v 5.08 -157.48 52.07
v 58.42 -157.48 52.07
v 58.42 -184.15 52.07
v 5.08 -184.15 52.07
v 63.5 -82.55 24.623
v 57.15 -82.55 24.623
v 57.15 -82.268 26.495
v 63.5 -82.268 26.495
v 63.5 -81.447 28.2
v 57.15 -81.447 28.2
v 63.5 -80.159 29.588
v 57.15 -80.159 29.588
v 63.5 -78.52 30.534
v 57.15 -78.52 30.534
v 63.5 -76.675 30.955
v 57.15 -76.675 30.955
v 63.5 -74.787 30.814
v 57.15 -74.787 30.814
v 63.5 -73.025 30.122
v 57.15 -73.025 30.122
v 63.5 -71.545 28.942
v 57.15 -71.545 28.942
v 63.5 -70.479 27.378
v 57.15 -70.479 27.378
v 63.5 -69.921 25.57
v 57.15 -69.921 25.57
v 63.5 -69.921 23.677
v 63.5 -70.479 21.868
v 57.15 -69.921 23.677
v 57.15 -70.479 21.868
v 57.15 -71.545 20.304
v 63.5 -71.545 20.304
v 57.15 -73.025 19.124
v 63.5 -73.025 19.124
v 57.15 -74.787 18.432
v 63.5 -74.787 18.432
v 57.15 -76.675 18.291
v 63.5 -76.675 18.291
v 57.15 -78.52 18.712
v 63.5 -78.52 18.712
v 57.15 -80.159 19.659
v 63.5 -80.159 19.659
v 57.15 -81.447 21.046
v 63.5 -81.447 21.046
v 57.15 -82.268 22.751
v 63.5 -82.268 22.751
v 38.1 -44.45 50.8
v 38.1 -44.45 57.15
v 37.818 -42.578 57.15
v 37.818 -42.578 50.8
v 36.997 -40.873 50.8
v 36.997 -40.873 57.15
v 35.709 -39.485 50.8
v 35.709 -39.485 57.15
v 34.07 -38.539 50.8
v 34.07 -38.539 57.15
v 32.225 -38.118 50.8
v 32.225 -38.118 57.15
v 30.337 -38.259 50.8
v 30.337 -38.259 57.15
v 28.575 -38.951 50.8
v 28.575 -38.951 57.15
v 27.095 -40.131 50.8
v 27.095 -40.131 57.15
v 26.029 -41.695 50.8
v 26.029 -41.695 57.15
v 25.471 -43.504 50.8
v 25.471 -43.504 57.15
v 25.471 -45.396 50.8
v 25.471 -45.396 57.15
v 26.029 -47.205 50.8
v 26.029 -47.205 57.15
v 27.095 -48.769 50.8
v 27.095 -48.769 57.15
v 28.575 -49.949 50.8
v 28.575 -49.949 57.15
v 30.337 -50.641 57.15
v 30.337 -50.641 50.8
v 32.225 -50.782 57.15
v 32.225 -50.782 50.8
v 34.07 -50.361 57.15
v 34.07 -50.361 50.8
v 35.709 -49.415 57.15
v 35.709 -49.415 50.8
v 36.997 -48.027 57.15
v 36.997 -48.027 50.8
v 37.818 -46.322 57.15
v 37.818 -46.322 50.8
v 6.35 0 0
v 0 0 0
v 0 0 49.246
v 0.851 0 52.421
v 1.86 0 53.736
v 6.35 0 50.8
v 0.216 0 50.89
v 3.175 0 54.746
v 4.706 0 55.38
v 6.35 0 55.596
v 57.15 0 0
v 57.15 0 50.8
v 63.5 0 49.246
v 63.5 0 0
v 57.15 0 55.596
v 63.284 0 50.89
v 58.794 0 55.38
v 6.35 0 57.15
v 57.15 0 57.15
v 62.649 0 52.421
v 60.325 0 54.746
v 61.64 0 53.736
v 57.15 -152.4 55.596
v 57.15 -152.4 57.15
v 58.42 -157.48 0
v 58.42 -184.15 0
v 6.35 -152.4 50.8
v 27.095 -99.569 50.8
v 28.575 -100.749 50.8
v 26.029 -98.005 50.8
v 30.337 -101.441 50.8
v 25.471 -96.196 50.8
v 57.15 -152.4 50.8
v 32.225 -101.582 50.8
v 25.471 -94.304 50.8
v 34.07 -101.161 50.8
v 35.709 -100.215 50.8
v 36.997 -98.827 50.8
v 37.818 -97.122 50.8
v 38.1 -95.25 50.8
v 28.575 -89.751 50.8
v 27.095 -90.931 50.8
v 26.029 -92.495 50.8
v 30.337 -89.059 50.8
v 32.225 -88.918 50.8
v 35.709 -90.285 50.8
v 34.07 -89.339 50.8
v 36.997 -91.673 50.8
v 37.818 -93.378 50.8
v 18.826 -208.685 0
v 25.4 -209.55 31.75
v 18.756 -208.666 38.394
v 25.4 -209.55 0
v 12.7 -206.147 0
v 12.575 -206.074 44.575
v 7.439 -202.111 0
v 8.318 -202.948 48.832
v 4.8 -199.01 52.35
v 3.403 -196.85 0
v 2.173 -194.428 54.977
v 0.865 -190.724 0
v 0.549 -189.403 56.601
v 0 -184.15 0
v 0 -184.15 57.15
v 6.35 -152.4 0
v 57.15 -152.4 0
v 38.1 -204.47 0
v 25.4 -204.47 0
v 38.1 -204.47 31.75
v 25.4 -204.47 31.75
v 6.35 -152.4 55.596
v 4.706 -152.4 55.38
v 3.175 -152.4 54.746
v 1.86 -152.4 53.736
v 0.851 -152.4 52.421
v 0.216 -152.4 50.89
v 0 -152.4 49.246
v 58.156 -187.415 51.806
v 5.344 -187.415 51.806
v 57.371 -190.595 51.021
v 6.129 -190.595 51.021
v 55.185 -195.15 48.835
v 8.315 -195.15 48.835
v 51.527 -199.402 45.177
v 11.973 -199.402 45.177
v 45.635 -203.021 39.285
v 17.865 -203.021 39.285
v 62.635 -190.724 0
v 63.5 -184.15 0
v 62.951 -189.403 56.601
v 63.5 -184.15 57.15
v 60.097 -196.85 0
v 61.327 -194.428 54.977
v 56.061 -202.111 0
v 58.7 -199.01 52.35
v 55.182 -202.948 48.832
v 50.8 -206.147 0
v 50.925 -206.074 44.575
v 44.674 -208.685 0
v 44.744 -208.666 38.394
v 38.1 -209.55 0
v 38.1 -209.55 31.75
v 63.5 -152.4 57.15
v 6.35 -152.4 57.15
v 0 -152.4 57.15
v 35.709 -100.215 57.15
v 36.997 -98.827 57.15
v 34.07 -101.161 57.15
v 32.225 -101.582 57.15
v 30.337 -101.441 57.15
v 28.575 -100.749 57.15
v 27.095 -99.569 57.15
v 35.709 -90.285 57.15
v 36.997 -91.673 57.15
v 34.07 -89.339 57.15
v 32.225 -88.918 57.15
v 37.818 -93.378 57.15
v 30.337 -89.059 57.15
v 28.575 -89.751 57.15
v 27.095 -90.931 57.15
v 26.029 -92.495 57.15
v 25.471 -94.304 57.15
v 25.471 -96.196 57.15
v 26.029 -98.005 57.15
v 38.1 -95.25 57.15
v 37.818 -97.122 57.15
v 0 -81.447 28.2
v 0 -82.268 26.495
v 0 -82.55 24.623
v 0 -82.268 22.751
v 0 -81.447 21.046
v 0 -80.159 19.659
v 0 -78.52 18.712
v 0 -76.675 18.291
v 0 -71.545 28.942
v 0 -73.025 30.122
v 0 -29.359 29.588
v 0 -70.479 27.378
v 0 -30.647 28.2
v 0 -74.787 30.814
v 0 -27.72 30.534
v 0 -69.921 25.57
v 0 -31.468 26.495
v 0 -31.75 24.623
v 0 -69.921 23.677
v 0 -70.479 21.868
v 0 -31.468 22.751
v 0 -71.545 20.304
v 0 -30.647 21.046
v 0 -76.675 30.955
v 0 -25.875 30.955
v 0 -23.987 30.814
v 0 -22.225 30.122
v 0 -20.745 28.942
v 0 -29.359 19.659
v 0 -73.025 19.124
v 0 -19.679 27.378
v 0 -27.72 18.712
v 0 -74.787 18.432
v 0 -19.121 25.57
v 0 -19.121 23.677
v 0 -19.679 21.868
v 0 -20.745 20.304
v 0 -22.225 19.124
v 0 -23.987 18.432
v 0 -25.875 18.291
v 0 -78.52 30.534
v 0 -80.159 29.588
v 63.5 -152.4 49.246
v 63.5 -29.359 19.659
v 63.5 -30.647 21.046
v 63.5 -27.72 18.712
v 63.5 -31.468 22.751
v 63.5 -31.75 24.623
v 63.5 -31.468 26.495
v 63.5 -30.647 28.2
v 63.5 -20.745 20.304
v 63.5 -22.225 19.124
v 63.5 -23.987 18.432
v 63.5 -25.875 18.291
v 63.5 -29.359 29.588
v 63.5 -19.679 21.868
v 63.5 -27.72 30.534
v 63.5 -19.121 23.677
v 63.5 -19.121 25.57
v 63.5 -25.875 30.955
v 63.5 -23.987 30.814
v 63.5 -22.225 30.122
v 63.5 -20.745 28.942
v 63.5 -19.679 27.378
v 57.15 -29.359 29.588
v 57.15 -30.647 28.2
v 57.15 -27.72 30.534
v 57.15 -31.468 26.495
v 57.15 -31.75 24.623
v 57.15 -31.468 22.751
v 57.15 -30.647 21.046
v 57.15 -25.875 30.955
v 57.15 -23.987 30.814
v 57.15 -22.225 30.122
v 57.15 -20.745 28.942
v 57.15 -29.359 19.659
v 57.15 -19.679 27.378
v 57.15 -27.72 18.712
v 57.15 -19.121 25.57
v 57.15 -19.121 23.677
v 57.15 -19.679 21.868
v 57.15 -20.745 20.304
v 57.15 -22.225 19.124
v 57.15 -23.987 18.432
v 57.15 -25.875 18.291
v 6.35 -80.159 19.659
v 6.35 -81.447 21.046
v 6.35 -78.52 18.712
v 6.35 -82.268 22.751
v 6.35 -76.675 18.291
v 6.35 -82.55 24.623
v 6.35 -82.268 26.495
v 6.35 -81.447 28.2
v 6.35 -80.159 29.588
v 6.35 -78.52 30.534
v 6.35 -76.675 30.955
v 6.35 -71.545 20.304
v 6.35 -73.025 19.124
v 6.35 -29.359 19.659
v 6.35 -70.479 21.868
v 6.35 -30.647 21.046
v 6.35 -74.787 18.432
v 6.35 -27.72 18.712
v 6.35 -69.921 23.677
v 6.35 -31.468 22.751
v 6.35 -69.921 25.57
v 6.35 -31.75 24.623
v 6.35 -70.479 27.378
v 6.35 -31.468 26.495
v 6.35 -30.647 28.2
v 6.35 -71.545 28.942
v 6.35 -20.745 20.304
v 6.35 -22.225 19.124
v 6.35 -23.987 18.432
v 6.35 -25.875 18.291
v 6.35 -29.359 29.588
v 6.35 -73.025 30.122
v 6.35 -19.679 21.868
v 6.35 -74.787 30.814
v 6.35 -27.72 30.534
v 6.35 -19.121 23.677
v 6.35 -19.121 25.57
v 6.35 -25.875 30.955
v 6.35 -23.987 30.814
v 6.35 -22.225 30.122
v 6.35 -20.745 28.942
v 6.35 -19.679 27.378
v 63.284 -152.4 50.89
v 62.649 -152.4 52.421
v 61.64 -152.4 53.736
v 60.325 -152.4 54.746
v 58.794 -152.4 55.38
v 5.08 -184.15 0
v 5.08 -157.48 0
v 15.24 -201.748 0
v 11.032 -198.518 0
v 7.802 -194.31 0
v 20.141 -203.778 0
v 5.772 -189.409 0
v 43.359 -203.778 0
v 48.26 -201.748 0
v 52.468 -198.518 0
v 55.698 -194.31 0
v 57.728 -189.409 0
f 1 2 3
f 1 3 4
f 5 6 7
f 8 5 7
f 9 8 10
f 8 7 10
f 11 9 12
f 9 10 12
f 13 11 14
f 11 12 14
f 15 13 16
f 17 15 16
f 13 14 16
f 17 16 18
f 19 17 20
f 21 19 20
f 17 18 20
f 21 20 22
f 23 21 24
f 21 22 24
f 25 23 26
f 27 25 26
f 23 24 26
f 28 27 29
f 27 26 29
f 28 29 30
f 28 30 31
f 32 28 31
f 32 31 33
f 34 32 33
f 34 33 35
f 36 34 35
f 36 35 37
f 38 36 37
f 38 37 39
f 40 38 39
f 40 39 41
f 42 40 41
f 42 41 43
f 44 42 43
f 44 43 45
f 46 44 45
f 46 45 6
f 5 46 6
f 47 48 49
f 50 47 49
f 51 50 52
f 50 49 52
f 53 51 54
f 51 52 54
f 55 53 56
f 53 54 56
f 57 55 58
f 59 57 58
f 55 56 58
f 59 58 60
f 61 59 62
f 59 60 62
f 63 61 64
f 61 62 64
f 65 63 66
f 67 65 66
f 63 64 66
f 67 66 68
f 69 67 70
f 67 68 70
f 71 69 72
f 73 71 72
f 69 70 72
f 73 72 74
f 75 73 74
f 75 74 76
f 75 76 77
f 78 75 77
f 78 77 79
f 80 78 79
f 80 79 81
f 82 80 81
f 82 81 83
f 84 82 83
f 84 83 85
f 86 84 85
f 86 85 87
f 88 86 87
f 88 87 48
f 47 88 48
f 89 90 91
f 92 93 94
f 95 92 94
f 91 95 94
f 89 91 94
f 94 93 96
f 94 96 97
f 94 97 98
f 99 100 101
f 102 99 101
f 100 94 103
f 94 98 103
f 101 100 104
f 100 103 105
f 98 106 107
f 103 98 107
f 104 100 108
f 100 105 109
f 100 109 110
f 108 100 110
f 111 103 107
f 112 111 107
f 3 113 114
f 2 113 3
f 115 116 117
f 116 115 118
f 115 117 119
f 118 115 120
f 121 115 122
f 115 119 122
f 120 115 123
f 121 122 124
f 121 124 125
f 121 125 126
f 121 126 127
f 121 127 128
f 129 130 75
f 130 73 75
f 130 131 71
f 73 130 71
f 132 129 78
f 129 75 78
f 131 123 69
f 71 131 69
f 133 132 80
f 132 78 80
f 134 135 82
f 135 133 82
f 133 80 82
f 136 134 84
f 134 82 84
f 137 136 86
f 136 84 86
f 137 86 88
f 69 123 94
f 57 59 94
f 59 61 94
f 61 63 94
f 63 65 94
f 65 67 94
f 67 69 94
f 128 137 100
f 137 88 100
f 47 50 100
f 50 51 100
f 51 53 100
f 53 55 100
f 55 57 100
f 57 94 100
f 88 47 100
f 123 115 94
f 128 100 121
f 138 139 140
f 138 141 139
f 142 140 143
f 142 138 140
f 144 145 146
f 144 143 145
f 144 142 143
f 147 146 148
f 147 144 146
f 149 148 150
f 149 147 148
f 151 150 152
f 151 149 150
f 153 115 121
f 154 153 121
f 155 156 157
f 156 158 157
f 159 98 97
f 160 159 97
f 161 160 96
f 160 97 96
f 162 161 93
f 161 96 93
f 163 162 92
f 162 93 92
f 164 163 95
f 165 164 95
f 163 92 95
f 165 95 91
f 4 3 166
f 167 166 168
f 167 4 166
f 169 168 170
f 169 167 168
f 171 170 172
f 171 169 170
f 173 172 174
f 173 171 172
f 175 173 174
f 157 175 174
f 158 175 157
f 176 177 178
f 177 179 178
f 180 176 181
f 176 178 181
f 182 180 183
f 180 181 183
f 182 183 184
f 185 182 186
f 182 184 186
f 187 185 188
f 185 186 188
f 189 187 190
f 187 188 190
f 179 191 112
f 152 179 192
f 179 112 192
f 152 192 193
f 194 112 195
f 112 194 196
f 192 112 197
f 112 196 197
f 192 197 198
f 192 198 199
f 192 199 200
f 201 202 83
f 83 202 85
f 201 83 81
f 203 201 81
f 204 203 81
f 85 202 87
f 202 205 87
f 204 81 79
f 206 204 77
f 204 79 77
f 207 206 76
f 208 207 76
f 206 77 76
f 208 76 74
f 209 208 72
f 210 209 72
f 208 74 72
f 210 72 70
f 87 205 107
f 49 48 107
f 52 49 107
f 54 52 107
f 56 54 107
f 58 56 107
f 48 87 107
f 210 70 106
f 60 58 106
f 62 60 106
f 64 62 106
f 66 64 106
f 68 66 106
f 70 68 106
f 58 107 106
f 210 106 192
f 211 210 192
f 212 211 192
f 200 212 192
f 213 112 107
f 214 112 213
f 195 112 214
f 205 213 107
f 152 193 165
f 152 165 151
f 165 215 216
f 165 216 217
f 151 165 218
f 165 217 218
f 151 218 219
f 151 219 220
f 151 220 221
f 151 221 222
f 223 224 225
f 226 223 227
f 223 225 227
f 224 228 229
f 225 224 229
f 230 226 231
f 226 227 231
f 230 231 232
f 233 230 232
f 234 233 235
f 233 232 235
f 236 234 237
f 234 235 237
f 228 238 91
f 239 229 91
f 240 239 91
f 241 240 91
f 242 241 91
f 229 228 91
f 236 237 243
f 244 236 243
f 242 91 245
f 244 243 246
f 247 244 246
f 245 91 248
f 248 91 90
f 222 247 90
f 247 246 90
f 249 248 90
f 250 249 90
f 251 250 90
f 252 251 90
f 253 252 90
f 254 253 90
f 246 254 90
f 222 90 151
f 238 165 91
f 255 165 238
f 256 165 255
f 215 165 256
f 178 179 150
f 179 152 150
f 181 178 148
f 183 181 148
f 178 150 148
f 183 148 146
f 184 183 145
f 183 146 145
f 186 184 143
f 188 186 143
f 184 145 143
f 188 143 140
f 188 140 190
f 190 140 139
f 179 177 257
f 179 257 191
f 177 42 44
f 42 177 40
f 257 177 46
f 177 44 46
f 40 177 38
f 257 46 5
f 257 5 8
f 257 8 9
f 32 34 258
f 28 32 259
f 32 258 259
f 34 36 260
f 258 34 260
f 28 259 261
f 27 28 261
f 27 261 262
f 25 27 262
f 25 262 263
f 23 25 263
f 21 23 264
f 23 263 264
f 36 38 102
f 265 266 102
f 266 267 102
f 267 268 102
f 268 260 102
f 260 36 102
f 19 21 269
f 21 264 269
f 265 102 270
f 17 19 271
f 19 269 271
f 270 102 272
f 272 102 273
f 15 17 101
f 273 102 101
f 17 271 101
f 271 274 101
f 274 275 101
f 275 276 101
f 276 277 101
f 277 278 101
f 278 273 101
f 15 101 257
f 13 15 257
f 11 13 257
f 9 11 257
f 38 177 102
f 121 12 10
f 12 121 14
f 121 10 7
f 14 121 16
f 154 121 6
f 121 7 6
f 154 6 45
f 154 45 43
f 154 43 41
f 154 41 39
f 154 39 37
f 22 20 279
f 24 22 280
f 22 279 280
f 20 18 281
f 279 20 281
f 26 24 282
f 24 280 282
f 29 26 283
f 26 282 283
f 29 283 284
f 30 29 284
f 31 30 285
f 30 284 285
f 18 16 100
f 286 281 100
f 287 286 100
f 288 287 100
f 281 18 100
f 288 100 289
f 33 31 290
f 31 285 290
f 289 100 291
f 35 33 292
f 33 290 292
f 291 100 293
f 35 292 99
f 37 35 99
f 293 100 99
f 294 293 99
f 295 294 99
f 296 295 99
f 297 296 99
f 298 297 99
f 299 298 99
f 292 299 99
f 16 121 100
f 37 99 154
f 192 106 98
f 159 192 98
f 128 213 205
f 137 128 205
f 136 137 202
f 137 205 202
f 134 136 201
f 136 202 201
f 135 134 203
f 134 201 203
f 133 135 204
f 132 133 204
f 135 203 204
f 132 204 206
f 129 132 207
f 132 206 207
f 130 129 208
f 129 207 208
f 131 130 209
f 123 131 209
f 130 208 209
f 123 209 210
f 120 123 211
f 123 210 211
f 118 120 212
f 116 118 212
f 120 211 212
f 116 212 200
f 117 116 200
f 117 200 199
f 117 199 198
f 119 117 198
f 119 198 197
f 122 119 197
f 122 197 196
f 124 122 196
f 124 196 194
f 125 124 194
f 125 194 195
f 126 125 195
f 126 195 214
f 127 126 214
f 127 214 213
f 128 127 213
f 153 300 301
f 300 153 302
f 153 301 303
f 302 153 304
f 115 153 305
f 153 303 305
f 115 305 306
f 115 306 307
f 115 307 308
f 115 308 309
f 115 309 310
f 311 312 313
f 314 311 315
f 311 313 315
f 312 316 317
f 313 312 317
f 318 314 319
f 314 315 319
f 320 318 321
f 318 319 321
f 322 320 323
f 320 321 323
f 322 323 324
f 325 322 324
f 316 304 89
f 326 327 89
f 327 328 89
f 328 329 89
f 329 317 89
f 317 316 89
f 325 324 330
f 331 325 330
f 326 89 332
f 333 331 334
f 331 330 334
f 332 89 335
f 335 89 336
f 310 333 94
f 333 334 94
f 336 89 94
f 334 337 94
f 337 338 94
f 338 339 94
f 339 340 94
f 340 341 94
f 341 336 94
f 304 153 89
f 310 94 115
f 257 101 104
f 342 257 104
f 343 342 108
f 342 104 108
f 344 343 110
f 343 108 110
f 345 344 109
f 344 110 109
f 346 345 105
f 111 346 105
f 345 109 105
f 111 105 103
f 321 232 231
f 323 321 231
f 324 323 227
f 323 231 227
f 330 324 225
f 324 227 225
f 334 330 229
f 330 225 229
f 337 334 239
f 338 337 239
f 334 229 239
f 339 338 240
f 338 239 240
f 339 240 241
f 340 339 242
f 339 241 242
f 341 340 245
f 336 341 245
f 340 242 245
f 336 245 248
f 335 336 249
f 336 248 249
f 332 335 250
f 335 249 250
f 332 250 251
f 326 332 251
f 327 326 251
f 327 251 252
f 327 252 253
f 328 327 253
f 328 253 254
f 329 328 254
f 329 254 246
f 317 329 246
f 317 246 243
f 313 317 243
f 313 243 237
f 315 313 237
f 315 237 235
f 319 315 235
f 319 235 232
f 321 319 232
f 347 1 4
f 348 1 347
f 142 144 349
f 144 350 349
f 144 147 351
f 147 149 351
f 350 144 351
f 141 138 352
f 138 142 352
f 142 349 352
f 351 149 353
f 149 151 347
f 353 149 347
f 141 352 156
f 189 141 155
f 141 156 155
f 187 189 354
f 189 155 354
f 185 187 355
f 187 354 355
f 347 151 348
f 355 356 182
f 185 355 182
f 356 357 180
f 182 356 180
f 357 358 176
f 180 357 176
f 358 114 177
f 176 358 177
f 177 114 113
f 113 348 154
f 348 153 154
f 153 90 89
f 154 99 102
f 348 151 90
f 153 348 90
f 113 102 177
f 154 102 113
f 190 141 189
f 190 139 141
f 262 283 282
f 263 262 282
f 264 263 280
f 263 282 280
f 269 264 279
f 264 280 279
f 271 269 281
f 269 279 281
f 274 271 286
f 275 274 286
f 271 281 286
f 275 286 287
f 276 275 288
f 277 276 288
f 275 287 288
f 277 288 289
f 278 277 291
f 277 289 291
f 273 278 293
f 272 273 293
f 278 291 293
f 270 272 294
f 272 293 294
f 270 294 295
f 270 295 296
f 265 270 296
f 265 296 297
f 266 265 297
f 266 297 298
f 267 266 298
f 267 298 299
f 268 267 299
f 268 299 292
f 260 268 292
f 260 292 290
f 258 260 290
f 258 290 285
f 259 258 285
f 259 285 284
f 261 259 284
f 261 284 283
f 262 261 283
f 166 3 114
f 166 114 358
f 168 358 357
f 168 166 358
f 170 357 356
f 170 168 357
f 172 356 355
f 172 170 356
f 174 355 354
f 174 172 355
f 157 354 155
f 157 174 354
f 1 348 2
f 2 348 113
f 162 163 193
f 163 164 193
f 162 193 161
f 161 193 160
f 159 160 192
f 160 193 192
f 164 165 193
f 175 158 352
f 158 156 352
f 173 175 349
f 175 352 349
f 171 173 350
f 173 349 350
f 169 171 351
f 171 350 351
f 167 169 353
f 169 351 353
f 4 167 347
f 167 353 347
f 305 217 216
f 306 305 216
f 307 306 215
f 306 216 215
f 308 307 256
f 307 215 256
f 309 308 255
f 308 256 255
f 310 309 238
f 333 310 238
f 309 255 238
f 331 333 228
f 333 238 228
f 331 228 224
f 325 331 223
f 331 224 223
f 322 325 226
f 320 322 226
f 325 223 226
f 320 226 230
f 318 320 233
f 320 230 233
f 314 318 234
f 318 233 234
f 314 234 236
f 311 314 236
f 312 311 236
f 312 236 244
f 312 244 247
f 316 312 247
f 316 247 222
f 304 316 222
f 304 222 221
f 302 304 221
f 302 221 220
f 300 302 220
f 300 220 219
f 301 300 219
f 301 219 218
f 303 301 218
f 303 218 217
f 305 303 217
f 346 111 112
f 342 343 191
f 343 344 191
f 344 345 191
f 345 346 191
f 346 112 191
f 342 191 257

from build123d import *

# Parameters (mm, degrees)
F1_DEPTH     = 152.4
F2_W         = 50.8
F2_H         = 50.8
F3_DEPTH     = 57.15
F4_R         = 25.4
F5_T         = 5.08
F5_T3_DEPTH  = 11.7136995755
F5_T5_DEPTH  = 162.56
F5_T7_DEPTH  = 60.96
F5_T9_DEPTH  = 60.96
F5_T12_ANGLE = 90.000000001
F5_T14_ANGLE = 90.000000001
F6_R         = 6.35
F7_DEPTH     = 63.501
F8_R         = 6.35
F9_DEPTH     = 57.151


# Not quite as in the source:
# - a shell that OpenCascade refuses in one call is made with other operations: the cavity is built on its own and cut out


with BuildPart() as f1:
    # F0 (on Front) → F1 (new body)
    with BuildSketch(Plane.XZ):
        with BuildLine():
            Line((0, 49.2463004245), (0, 0))
            Line((0, 0), (6.35, 0))
            Line((6.35, 0), (6.35, 50.8))
            Line((6.35, 50.8), (57.15, 50.8))
            Line((57.15, 50.8), (57.15, 0))
            Line((57.15, 0), (63.5, 0))
            Line((63.5, 0), (63.5, 49.2463004245))
            ThreePointArc((63.5, 49.2463004245), (61.6401280605, 53.736428485), (57.15, 55.5963004245))
            Line((57.15, 55.5963004245), (57.15, 57.15))
            Line((57.15, 57.15), (6.35, 57.15))
            Line((6.35, 57.15), (6.35, 55.5963004245))
            ThreePointArc((6.35, 55.5963004245), (1.8598719395, 53.736428485), (0, 49.2463004245))
        make_face()
    extrude(amount=F1_DEPTH)

    # F2 (on face) → F3 (join)
    with BuildSketch(Plane.XZ.offset(152.4)):
        with BuildLine():
            Line((0, 49.2463004245), (0, 0))
            Line((0, 0), (6.35, 0))
            Line((6.35, 0), (6.35, 50.8))
            Line((6.35, 50.8), (57.15, 50.8))
            Line((57.15, 50.8), (57.15, 0))
            Line((57.15, 0), (63.5, 0))
            Line((63.5, 0), (63.5, 49.2463004245))
            ThreePointArc((63.5, 49.2463004245), (61.6401280605, 53.736428485), (57.15, 55.5963004245))
            Line((57.15, 55.5963004245), (57.15, 57.15))
            Line((57.15, 57.15), (6.35, 57.15))
            Line((6.35, 57.15), (6.35, 55.5963004245))
            ThreePointArc((6.35, 55.5963004245), (1.8598719395, 53.736428485), (0, 49.2463004245))
        make_face()
        with BuildLine():
            Line((0, 57.15), (0, 49.2463004245))
            ThreePointArc((0, 49.2463004245), (1.8598719395, 53.736428485), (6.35, 55.5963004245))
            Line((6.35, 55.5963004245), (6.35, 57.15))
            Line((6.35, 57.15), (0, 57.15))
        make_face()
        with BuildLine():
            ThreePointArc((57.15, 55.5963004245), (61.6401280605, 53.736428485), (63.5, 49.2463004245))
            Line((63.5, 49.2463004245), (63.5, 57.15))
            Line((63.5, 57.15), (57.15, 57.15))
            Line((57.15, 57.15), (57.15, 55.5963004245))
        make_face()
        with Locations((31.75, 25.4)):
            Rectangle(F2_W, F2_H)
    extrude(amount=F3_DEPTH)

    # F4
    f4_edges = [f1.edges().sort_by_distance(p)[0] for p in [
        (31.75, -209.55, 57.15),
        (0, -209.55, 28.575),
        (63.5, -209.55, 28.575),
    ]]
    fillet(f4_edges, radius=F4_R)

    # F5: shell of thickness 5.08, made by hand


with BuildPart() as f5_core1:
    # F5_t2: copy of F1
    add(f1.part)

    # the walls: a layer under each face that stays
    f5_faces = [f5_core1.faces().sort_by_distance(p)[0] for p in [
        (0, -92.075, 28.575),
        (31.75, -92.075, 57.15),
        (7.4394877579, -202.1105122421, 28.575),
        (1.0583333333, -152.4, 53.1981502122),
        (1.8598719395, -76.2, 53.736428485),
        (4.5357142857, 0, 4.0821428571),
        (63.5, -92.075, 28.575),
        (31.75, -202.1105122421, 49.7105122421),
        (58.2083333333, -152.4, 55.8327167374),
        (57.15, -76.2, 56.3731502122),
        (6.35, -76.2, 56.3731502122),
        (31.75, -209.55, 15.875),
        (6.35, -76.2, 25.4),
        (56.0605122421, -202.1105122421, 28.575),
        (31.75, -152.4, 25.4),
        (57.15, -76.2, 25.4),
        (31.75, -76.2, 50.8),
        (61.6401280605, -76.2, 53.736428485),
    ]]
    thicken(f5_faces, amount=-F5_T, mode=Mode.SUBTRACT)

    # F5_s4 → F5_t3 (cut)
    with BuildSketch(Plane.XY.offset(50.5163004245)):
        Polygon((6.2992, -152.3492), (6.35, -157.48), (11.43, -157.48), (11.43, -152.4), align=None)
        Polygon((57.2008, -152.3492), (57.15, -157.48), (52.07, -157.48), (52.07, -152.4), align=None)
    extrude(amount=F5_T3_DEPTH, mode=Mode.SUBTRACT)

    # F5_s6 → F5_t5 (cut)
    with BuildSketch(Plane.XZ.offset(-5.08)):
        Polygon((6.2992, 55.6471004245), (6.35, 50.5163004245), (11.43, 50.5163004245), (11.43, 55.5963004245), align=None)
        Polygon((57.2008, 55.6471004245), (52.07, 55.5963004245), (52.07, 50.5163004245), (57.15, 50.5163004245), align=None)
        Polygon((6.4008, 50.7492), (1.27, 50.8), (1.27, 55.88), (6.35, 55.88), align=None)
        Polygon((57.0992, 50.7492), (62.23, 50.8), (62.23, 55.88), (57.15, 55.88), align=None)
    extrude(amount=F5_T5_DEPTH, mode=Mode.SUBTRACT)

    # F5_s8 → F5_t7 (cut)
    with BuildSketch(Plane.XY.offset(-5.08)):
        Polygon((6.4008, -152.3492), (1.27, -152.4), (1.27, -157.48), (6.35, -157.48), align=None)
        Polygon((57.0992, -152.3492), (57.15, -157.48), (62.23, -157.48), (62.23, -152.4), align=None)
    extrude(amount=F5_T7_DEPTH, mode=Mode.SUBTRACT)

    # F5_s10 → F5_t9 (cut)
    with BuildSketch(Plane.YZ.offset(1.27)):
        Polygon((-152.3492, 50.7492), (-157.48, 50.8), (-157.48, 55.88), (-152.4, 55.88), align=None)
    extrude(amount=F5_T9_DEPTH, mode=Mode.SUBTRACT)

    # F5_s11 → F5_t12 (revolve, cut)
    with BuildSketch(Plane.YZ.offset(6.35)):
        Polygon((-152.3492, 55.6471004245), (-157.48, 55.5963004245), (-157.48, 50.5163004245), (-152.4, 50.5163004245), align=None)
    revolve(axis=Axis((6.35, -152.4, 49.2463004245), (0, -1, 0)), revolution_arc=F5_T12_ANGLE, mode=Mode.SUBTRACT)

    # F5_s13 → F5_t14 (revolve, cut)
    with BuildSketch(Plane.XY.offset(49.2463004245)):
        Polygon((63.5508, -152.3492), (63.5, -157.48), (58.42, -157.48), (58.42, -152.4), align=None)
    revolve(axis=Axis((57.15, -152.4, 49.2463004245), (0, -1, 0)), revolution_arc=F5_T14_ANGLE, mode=Mode.SUBTRACT)


with BuildPart() as f1_1:
    add(f1.part)

    # what is left inside the walls is the cavity
    f5_cavity = [f5_core1.part.solids().sort_by_distance(p)[0] for p in [
        (31.75, -157.5308, 34.713333),
    ]]
    add(f5_cavity, mode=Mode.SUBTRACT)

    # F6 (on face) → F7 (cut, through all)
    with BuildSketch(Plane(origin=(0, 0, 0), x_dir=(0, -1, 0), z_dir=(-1, 0, 0))):
        with Locations((25.4, 24.6231502122)):
            Circle(F6_R)
        with Locations((76.2, 24.6231502122)):
            Circle(F6_R)
    extrude(amount=-F7_DEPTH, mode=Mode.SUBTRACT)

    # F8 (on face) → F9 (cut, through all)
    with BuildSketch(Plane.XY.offset(57.15)):
        with Locations((31.75, -44.45)):
            Circle(F8_R)
        with Locations((31.75, -95.25)):
            Circle(F8_R)
    extrude(amount=-F9_DEPTH, mode=Mode.SUBTRACT)


solid = f1_1.part
